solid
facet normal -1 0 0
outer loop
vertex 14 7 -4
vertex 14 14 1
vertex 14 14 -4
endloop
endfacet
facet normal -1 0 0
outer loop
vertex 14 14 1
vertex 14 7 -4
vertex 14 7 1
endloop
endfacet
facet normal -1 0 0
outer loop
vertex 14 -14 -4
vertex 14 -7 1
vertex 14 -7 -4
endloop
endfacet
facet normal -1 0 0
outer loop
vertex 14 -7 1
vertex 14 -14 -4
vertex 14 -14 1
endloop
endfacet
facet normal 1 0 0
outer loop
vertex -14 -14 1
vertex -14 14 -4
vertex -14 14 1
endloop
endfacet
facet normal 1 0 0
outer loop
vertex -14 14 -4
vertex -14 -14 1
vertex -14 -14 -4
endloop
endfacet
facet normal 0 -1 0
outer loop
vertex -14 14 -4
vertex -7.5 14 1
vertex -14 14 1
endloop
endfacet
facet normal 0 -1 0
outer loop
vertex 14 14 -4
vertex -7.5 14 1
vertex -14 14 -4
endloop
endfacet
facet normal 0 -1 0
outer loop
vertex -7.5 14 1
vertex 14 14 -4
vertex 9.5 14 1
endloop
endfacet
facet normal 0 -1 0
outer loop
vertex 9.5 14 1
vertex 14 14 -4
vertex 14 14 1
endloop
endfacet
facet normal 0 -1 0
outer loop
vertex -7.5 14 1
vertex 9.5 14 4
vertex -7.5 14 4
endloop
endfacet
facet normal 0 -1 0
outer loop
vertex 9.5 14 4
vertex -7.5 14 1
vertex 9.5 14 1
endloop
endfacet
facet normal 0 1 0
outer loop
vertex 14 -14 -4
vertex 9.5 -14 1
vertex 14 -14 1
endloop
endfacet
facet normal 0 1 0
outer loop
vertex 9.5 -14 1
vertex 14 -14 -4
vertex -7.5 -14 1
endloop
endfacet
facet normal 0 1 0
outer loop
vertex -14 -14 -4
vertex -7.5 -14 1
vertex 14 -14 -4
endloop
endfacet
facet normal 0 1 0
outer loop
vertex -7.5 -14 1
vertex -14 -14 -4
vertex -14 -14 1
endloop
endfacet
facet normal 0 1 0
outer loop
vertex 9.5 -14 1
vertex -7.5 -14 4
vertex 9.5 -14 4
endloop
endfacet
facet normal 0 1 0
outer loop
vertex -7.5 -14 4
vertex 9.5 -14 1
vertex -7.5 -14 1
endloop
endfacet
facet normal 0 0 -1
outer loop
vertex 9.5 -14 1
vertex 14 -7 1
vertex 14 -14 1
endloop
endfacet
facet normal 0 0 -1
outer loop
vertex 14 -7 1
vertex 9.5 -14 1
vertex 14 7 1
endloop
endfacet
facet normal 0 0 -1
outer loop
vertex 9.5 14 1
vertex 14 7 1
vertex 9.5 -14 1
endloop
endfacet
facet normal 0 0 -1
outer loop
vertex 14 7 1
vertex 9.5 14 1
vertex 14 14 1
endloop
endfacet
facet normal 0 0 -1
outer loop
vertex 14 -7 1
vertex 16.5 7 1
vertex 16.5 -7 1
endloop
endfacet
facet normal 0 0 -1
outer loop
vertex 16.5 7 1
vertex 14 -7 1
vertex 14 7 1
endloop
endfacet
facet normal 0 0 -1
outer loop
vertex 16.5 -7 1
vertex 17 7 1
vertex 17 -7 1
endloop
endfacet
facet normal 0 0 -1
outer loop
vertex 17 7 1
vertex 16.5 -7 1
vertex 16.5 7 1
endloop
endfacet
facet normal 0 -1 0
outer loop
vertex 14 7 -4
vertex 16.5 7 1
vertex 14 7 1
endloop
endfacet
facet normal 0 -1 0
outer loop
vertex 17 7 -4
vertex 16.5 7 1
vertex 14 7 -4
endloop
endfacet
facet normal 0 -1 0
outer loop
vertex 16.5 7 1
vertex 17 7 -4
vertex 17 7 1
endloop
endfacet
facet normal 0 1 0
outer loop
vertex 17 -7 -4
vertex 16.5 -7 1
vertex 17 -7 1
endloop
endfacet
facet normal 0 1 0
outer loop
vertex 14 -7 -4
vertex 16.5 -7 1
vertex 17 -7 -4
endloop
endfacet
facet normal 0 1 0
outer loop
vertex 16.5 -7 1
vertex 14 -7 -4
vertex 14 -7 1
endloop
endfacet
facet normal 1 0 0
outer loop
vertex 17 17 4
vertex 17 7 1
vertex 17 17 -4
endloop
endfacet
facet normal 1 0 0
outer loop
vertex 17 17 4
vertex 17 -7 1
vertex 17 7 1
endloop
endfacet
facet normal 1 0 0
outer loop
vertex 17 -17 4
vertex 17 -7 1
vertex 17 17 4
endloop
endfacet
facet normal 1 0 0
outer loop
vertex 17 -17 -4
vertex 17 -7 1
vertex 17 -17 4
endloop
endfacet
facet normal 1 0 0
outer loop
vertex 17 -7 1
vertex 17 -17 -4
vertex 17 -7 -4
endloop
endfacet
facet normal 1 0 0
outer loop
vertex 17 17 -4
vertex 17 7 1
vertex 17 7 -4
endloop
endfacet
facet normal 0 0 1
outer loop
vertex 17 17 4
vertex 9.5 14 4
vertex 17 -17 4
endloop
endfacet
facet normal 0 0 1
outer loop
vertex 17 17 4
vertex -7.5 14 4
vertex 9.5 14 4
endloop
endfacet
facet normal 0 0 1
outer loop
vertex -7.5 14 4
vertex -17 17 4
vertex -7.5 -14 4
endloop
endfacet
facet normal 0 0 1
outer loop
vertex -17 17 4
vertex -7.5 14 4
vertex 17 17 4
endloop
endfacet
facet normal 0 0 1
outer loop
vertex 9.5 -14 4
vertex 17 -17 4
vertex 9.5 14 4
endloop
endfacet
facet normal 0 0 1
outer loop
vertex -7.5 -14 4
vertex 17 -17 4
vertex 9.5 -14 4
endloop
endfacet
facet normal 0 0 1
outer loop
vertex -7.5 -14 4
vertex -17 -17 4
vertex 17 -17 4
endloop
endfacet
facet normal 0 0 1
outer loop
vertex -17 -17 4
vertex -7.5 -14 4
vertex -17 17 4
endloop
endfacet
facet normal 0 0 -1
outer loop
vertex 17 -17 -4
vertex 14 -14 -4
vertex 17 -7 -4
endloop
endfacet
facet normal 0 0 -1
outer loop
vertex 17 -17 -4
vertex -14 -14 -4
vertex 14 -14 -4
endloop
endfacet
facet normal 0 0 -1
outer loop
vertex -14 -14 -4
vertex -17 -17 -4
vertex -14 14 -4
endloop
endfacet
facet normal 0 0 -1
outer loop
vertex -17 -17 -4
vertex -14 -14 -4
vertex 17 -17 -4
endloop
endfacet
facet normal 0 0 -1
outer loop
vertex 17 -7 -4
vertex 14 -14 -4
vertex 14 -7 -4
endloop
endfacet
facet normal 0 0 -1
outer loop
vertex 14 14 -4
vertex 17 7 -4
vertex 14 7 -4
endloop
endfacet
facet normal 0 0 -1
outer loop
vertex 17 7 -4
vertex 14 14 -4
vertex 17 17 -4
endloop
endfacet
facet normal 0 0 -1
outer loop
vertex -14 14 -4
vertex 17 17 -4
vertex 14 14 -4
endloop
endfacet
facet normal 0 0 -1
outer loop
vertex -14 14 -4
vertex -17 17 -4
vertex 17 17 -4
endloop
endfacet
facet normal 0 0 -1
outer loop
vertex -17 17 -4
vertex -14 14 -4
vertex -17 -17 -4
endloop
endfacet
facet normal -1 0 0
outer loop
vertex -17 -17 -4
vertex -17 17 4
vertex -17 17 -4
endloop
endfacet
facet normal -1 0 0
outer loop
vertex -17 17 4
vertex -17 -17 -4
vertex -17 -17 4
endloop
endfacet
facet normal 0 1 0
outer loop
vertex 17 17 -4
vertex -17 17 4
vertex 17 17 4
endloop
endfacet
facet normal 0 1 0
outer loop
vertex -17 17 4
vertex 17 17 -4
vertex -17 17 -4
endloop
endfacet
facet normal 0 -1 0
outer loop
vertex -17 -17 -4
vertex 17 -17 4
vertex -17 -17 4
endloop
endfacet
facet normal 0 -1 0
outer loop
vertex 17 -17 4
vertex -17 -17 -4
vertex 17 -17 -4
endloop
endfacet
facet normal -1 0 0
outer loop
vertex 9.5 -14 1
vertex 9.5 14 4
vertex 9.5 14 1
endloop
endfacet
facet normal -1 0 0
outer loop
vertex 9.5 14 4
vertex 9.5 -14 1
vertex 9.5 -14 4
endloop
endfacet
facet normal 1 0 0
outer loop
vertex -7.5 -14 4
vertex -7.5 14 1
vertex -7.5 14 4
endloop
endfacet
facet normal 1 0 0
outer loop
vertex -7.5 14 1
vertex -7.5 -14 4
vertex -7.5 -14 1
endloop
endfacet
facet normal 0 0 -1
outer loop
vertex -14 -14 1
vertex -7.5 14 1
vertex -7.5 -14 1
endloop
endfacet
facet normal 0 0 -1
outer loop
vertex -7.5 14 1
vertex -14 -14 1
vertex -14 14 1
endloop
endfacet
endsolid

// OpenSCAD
length = 28;
width = 28;
depth = 5;
prodWidth = 3;

outerLength = length + (prodWidth*2);
outerWidth = width + (prodWidth*2);
outerDepth = depth + (prodWidth);

module main()  {  
   casing_offset = 1; 
    
    //sub cover
                translate([13, 0, depth/2]) {
                    cube([7, outerWidth, prodWidth], true); 
                } 
                
                 translate([-12, 0, depth/2]) {
                    cube([9, outerWidth, prodWidth], true); 
                } 
                
     module lid() {   
        ///  lid
        difference() {
            union() {
                 
                
                //backing inner
                translate([0, 0, prodWidth-depth]) {
                    cube([length, width, prodWidth*2], true);  
                }  
                //backing
                translate([0, 0, -depth]) {
                    cube([outerLength, outerWidth, prodWidth], true); 
                } 
            }
           
        }
    }
    
    module case() {    
        difference() {
            union() {
                
                //main
                cube([outerLength, outerWidth, outerDepth], true);  
                
                
                
            }
            
            union() {
                
                // logo
//                translate([50, prodWidth+15.5, prodWidth+height+4]) {
//                    scale([0.08, 0.08, 0.01]) {
//                        surface(file = "falcon.png", center = true, invert = true);
//                    }
//                }
                
                // cavity
                translate([0, 0, 0]) {
                    cube([length, width, depth+5], true);  
                }  
                
                translate([10, 0, -4]) {
                    cube([length+10, width/2, depth+5], true);  
                }  
                
            }
            
        }
    }
   

   case();
   //lid();

}

main();
